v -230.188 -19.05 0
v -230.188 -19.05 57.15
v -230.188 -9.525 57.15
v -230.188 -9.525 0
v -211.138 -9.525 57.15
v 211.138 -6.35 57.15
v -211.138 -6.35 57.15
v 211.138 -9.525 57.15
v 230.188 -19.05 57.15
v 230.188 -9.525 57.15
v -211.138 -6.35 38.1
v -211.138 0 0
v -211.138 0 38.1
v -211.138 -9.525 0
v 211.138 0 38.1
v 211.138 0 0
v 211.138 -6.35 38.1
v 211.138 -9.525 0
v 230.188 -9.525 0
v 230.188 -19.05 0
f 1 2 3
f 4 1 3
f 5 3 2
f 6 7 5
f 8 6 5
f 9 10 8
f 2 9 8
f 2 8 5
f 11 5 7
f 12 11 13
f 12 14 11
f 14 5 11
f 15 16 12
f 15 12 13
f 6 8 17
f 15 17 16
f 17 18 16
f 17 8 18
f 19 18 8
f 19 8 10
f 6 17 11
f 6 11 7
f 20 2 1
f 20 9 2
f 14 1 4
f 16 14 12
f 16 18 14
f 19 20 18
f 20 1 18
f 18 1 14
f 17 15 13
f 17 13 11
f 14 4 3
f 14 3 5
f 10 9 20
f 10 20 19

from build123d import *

# Parameters (mm, degrees)
F1_DEPTH      = 230.1875
F2_W          = 19.05
F2_H          = 9.525
F3_DEPTH      = 493
F3_DEPTH_BACK = 57.151


# Not quite as in the source:
# - an extrude ends at something that could not be found from the text; its depth is read off the source's solid


with BuildPart() as f1:
    # F0 (on Right) → F1 (new body, symmetric)
    with BuildSketch(Plane.YZ):
        Polygon((-19.05, 57.15), (-19.05, 0), (0, 0), (0, 38.1), (-6.35, 38.1), (-6.35, 57.15), align=None)
    extrude(amount=F1_DEPTH, both=True)

    # F2 (on Top) → F3 (cut, two sides)
    with BuildSketch(Plane.XY) as f3_sk:
        with Locations((220.6625, -4.7625)):
            Rectangle(F2_W, F2_H)
        with Locations((-220.6625, -4.7625)):
            Rectangle(F2_W, F2_H)
    extrude(amount=-F3_DEPTH, mode=Mode.SUBTRACT)
    extrude(f3_sk.sketch, amount=F3_DEPTH_BACK, mode=Mode.SUBTRACT)


solid = f1.part
